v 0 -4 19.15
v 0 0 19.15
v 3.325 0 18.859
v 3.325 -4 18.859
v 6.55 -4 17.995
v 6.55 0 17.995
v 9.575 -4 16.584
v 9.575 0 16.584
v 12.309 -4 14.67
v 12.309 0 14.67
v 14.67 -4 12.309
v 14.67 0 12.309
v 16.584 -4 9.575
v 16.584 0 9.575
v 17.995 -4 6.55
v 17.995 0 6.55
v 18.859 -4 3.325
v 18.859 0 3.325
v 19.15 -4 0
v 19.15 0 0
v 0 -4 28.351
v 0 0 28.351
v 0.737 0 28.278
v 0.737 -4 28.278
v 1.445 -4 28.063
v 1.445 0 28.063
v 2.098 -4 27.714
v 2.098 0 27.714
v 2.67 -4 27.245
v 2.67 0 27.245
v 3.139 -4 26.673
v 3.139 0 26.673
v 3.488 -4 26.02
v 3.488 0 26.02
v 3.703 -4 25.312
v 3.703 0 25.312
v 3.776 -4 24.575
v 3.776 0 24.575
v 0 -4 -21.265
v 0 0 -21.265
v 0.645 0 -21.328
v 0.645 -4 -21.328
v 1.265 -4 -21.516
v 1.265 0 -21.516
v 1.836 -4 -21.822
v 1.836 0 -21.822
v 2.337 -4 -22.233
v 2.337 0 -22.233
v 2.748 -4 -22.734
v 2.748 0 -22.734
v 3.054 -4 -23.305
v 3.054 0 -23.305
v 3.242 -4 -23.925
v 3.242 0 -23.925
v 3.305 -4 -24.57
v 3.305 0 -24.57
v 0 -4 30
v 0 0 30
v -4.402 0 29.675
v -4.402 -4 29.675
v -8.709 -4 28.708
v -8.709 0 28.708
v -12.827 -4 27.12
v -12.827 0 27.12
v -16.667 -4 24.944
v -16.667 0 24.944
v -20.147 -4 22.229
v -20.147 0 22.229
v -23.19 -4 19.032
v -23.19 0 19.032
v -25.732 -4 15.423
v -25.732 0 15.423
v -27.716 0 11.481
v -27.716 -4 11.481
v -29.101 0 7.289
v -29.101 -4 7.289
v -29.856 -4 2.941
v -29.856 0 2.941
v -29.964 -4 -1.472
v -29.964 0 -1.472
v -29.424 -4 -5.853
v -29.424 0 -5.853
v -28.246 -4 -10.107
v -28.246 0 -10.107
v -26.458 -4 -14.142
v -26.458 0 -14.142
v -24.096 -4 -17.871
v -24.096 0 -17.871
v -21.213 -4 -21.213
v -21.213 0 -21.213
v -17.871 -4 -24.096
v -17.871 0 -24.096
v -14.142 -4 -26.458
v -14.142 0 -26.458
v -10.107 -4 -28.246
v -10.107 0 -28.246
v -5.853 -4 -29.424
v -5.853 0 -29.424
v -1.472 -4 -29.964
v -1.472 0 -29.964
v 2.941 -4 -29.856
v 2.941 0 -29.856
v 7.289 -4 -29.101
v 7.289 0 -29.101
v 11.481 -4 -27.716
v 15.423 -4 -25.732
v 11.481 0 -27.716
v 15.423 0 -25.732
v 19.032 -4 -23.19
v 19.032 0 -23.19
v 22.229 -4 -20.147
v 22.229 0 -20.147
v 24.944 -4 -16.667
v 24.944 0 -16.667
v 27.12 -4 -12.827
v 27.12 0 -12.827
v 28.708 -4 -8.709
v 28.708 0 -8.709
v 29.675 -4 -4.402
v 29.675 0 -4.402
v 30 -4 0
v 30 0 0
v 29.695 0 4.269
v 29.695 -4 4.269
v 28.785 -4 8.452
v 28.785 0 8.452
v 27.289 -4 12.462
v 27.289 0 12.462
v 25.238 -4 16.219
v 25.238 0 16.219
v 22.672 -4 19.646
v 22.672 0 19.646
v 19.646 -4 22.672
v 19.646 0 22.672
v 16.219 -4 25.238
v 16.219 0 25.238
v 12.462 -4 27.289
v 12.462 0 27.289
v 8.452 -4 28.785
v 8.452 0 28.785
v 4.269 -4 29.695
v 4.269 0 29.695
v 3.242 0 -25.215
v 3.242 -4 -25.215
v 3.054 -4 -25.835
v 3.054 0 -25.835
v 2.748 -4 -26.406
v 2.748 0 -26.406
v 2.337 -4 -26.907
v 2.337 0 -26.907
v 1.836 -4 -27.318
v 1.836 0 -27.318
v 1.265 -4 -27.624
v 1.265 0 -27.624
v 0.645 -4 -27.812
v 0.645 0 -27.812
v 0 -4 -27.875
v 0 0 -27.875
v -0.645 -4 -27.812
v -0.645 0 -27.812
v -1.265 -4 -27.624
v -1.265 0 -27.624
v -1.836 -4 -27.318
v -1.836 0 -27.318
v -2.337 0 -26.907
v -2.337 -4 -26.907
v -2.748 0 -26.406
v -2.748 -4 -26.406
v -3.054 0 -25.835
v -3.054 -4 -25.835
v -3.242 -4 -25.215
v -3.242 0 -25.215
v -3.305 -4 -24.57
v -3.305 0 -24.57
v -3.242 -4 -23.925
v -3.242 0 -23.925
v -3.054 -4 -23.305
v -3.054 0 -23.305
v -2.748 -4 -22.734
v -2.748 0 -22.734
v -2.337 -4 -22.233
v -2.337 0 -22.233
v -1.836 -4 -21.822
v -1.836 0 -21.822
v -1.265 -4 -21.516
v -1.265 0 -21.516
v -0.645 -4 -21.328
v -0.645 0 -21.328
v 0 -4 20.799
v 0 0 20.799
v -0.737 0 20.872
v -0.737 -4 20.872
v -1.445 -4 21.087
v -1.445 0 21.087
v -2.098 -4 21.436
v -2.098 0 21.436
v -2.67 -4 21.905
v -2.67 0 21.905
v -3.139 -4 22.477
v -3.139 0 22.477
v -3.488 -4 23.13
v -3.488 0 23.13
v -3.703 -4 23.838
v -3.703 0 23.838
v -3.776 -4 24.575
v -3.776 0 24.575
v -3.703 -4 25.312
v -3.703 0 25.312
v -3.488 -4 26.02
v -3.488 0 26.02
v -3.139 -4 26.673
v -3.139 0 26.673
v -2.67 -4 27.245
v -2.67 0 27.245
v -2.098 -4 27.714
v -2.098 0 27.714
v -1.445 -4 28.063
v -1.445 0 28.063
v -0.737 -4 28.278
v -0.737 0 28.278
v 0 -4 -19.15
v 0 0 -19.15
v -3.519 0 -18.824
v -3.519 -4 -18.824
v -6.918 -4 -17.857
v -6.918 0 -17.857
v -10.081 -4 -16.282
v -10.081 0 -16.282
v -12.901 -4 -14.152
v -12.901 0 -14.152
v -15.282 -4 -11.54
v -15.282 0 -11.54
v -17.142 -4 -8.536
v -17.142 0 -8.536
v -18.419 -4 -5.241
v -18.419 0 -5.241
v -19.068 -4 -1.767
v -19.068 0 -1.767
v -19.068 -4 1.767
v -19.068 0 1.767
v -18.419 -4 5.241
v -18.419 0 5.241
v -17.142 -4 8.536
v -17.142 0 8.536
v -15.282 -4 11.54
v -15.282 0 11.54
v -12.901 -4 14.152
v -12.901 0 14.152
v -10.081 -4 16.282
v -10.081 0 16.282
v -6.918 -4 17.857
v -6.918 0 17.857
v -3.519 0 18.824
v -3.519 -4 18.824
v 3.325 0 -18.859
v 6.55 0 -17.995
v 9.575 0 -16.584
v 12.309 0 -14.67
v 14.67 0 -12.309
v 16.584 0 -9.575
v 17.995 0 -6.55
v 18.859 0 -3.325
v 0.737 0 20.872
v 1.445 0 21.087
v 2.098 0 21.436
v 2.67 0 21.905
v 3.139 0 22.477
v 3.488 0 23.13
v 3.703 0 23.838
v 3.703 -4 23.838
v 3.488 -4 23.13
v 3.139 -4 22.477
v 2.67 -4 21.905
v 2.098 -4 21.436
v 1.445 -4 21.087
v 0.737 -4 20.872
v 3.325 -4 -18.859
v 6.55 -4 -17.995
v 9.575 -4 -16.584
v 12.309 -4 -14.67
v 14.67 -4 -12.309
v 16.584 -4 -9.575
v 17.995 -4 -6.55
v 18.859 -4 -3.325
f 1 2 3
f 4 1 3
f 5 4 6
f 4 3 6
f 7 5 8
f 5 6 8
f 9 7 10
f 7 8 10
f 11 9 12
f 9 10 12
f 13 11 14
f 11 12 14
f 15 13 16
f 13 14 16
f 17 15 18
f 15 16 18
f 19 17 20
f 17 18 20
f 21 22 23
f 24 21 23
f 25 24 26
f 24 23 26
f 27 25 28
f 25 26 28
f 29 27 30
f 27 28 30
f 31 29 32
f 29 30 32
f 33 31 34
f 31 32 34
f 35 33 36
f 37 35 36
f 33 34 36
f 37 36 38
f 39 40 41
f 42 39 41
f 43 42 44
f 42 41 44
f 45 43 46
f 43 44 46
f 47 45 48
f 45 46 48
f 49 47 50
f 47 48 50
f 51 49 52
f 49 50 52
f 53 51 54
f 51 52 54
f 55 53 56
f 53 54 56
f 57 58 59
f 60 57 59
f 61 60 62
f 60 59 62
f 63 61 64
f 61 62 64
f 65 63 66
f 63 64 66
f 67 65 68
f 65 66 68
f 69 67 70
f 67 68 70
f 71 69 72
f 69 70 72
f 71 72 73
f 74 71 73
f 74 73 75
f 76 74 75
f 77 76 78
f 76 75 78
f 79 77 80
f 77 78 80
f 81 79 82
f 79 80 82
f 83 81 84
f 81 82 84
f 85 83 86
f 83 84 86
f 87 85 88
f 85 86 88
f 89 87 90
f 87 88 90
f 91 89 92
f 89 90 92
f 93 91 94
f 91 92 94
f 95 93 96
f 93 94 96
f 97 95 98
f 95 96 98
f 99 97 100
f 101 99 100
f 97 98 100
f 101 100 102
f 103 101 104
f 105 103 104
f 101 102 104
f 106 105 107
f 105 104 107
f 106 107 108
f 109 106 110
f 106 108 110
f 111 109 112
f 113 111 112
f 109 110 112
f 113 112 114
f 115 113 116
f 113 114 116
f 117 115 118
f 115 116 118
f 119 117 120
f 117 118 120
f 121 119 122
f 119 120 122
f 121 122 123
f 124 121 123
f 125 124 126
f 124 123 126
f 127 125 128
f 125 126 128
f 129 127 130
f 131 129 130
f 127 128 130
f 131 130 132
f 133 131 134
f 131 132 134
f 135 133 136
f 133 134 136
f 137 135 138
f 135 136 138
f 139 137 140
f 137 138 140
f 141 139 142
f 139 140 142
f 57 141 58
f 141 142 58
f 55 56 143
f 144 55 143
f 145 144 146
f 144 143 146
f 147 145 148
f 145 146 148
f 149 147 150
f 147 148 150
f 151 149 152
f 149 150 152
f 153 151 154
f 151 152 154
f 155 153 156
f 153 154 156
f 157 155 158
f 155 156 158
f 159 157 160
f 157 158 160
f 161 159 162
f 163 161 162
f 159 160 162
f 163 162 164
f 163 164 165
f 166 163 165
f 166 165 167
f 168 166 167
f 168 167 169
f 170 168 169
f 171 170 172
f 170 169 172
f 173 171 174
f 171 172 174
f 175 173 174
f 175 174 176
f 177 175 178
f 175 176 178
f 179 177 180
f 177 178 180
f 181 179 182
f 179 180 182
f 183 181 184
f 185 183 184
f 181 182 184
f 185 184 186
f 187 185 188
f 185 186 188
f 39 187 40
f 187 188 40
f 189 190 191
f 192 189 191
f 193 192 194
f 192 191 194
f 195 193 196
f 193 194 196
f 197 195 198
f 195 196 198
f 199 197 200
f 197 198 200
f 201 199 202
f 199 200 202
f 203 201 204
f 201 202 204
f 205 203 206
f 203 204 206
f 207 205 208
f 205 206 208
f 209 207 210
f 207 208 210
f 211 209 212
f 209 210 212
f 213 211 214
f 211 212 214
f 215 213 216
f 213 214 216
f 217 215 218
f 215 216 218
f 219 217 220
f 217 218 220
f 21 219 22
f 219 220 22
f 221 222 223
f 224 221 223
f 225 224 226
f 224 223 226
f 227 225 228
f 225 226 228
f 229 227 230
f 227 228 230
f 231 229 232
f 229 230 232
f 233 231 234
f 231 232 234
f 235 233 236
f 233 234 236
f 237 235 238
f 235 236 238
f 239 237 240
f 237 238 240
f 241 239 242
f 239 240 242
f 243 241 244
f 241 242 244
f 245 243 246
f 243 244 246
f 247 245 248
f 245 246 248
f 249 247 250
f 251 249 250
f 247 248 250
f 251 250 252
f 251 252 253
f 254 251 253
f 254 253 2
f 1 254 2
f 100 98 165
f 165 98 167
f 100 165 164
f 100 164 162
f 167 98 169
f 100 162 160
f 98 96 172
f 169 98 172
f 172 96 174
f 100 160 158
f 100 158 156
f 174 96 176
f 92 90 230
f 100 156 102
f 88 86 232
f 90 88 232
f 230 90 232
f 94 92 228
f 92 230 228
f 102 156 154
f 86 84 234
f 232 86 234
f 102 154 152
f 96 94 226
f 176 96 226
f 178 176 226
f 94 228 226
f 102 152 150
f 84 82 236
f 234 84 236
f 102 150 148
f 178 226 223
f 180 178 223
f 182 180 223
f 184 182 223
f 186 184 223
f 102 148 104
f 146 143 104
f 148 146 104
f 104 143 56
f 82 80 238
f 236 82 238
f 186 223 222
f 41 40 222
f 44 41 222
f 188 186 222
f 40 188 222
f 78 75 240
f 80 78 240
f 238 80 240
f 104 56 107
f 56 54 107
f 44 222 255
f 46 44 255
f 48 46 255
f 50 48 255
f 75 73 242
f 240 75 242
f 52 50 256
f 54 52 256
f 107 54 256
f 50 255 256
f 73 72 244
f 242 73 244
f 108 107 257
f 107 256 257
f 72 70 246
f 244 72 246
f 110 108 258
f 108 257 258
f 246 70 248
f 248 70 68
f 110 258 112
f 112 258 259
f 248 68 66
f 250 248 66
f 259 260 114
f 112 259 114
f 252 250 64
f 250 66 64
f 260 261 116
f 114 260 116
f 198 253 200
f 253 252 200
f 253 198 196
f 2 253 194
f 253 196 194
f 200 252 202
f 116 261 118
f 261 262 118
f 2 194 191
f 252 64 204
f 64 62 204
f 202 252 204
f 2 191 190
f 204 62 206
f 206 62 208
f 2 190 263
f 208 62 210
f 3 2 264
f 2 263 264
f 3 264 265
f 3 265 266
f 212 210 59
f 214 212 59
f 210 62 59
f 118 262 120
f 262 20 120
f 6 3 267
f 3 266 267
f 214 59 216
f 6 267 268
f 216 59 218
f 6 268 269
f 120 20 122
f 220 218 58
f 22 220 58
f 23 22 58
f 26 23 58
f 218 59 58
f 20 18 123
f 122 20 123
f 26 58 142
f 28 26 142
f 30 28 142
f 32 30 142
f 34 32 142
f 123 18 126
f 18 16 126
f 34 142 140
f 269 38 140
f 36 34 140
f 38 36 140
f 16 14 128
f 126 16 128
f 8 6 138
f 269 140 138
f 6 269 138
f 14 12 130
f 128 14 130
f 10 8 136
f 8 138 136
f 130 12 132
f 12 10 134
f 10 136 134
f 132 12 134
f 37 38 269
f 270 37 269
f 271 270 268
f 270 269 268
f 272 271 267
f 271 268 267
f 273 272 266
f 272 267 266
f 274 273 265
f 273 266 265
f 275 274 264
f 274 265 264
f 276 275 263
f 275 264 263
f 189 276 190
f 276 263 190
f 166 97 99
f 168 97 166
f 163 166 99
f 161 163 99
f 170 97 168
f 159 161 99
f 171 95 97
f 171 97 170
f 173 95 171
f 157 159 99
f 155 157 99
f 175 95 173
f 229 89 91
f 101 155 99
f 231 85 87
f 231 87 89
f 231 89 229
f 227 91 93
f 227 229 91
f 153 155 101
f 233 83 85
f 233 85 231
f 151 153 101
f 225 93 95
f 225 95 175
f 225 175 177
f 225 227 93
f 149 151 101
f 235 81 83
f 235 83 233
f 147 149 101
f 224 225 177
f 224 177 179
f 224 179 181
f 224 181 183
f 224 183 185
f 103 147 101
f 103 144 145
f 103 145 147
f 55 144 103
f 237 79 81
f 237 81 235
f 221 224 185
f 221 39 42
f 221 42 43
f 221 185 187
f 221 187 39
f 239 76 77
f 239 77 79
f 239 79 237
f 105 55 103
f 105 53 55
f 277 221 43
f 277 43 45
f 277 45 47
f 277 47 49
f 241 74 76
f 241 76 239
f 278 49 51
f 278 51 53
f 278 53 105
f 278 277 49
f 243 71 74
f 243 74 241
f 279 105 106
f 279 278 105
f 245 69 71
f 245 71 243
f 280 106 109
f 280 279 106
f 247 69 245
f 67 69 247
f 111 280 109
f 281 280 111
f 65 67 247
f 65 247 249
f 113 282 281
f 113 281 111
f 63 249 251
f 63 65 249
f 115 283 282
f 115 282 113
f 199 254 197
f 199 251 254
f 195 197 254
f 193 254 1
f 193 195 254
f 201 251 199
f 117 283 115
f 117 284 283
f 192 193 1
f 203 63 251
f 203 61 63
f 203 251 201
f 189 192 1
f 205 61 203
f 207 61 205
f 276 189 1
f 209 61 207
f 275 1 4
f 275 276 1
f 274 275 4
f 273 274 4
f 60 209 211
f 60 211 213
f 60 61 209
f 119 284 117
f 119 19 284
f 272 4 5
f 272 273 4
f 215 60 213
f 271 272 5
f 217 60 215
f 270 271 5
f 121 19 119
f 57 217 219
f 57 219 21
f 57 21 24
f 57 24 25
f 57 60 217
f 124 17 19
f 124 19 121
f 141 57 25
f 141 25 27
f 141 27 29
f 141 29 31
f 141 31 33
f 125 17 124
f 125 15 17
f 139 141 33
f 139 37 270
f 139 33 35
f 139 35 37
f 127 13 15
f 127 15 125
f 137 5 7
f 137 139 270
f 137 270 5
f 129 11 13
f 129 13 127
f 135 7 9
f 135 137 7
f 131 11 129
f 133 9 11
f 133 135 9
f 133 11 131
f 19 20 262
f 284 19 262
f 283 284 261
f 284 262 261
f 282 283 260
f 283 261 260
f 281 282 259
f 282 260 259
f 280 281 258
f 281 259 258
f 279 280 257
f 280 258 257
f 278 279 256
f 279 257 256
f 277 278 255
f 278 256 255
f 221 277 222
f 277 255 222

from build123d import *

# Parameters (mm, degrees)
F1_DEPTH = 4


with BuildPart() as f1:
    # F0 (on Front) → F1 (new body)
    with BuildSketch(Plane.XZ):
        with BuildLine():
            ThreePointArc((0, 30), (-21.213203, -21.213203), (30, 0))
            ThreePointArc((30, 0), (21.213203, 21.213203), (0, 30))
        make_face()
        with BuildLine():
            ThreePointArc((3.305106, -24.57), (-2.337063, -26.907063), (0, -21.264894))
            ThreePointArc((0, -21.264894), (2.337063, -22.232937), (3.305106, -24.57))
        make_face(mode=Mode.SUBTRACT)
        with BuildLine():
            ThreePointArc((0, -19.15), (-19.15, 0), (0, 19.15))
            ThreePointArc((0, 19.15), (13.541095, 13.541095), (19.15, 0))
            ThreePointArc((19.15, 0), (13.541095, -13.541095), (0, -19.15))
        make_face(mode=Mode.SUBTRACT)
        with BuildLine():
            ThreePointArc((0, 20.799246), (-3.775754, 24.575), (0, 28.350754))
            ThreePointArc((0, 28.350754), (2.669861, 27.244861), (3.775754, 24.575))
            ThreePointArc((3.775754, 24.575), (2.669861, 21.905139), (0, 20.799246))
        make_face(mode=Mode.SUBTRACT)
    extrude(amount=F1_DEPTH)


solid = f1.part
